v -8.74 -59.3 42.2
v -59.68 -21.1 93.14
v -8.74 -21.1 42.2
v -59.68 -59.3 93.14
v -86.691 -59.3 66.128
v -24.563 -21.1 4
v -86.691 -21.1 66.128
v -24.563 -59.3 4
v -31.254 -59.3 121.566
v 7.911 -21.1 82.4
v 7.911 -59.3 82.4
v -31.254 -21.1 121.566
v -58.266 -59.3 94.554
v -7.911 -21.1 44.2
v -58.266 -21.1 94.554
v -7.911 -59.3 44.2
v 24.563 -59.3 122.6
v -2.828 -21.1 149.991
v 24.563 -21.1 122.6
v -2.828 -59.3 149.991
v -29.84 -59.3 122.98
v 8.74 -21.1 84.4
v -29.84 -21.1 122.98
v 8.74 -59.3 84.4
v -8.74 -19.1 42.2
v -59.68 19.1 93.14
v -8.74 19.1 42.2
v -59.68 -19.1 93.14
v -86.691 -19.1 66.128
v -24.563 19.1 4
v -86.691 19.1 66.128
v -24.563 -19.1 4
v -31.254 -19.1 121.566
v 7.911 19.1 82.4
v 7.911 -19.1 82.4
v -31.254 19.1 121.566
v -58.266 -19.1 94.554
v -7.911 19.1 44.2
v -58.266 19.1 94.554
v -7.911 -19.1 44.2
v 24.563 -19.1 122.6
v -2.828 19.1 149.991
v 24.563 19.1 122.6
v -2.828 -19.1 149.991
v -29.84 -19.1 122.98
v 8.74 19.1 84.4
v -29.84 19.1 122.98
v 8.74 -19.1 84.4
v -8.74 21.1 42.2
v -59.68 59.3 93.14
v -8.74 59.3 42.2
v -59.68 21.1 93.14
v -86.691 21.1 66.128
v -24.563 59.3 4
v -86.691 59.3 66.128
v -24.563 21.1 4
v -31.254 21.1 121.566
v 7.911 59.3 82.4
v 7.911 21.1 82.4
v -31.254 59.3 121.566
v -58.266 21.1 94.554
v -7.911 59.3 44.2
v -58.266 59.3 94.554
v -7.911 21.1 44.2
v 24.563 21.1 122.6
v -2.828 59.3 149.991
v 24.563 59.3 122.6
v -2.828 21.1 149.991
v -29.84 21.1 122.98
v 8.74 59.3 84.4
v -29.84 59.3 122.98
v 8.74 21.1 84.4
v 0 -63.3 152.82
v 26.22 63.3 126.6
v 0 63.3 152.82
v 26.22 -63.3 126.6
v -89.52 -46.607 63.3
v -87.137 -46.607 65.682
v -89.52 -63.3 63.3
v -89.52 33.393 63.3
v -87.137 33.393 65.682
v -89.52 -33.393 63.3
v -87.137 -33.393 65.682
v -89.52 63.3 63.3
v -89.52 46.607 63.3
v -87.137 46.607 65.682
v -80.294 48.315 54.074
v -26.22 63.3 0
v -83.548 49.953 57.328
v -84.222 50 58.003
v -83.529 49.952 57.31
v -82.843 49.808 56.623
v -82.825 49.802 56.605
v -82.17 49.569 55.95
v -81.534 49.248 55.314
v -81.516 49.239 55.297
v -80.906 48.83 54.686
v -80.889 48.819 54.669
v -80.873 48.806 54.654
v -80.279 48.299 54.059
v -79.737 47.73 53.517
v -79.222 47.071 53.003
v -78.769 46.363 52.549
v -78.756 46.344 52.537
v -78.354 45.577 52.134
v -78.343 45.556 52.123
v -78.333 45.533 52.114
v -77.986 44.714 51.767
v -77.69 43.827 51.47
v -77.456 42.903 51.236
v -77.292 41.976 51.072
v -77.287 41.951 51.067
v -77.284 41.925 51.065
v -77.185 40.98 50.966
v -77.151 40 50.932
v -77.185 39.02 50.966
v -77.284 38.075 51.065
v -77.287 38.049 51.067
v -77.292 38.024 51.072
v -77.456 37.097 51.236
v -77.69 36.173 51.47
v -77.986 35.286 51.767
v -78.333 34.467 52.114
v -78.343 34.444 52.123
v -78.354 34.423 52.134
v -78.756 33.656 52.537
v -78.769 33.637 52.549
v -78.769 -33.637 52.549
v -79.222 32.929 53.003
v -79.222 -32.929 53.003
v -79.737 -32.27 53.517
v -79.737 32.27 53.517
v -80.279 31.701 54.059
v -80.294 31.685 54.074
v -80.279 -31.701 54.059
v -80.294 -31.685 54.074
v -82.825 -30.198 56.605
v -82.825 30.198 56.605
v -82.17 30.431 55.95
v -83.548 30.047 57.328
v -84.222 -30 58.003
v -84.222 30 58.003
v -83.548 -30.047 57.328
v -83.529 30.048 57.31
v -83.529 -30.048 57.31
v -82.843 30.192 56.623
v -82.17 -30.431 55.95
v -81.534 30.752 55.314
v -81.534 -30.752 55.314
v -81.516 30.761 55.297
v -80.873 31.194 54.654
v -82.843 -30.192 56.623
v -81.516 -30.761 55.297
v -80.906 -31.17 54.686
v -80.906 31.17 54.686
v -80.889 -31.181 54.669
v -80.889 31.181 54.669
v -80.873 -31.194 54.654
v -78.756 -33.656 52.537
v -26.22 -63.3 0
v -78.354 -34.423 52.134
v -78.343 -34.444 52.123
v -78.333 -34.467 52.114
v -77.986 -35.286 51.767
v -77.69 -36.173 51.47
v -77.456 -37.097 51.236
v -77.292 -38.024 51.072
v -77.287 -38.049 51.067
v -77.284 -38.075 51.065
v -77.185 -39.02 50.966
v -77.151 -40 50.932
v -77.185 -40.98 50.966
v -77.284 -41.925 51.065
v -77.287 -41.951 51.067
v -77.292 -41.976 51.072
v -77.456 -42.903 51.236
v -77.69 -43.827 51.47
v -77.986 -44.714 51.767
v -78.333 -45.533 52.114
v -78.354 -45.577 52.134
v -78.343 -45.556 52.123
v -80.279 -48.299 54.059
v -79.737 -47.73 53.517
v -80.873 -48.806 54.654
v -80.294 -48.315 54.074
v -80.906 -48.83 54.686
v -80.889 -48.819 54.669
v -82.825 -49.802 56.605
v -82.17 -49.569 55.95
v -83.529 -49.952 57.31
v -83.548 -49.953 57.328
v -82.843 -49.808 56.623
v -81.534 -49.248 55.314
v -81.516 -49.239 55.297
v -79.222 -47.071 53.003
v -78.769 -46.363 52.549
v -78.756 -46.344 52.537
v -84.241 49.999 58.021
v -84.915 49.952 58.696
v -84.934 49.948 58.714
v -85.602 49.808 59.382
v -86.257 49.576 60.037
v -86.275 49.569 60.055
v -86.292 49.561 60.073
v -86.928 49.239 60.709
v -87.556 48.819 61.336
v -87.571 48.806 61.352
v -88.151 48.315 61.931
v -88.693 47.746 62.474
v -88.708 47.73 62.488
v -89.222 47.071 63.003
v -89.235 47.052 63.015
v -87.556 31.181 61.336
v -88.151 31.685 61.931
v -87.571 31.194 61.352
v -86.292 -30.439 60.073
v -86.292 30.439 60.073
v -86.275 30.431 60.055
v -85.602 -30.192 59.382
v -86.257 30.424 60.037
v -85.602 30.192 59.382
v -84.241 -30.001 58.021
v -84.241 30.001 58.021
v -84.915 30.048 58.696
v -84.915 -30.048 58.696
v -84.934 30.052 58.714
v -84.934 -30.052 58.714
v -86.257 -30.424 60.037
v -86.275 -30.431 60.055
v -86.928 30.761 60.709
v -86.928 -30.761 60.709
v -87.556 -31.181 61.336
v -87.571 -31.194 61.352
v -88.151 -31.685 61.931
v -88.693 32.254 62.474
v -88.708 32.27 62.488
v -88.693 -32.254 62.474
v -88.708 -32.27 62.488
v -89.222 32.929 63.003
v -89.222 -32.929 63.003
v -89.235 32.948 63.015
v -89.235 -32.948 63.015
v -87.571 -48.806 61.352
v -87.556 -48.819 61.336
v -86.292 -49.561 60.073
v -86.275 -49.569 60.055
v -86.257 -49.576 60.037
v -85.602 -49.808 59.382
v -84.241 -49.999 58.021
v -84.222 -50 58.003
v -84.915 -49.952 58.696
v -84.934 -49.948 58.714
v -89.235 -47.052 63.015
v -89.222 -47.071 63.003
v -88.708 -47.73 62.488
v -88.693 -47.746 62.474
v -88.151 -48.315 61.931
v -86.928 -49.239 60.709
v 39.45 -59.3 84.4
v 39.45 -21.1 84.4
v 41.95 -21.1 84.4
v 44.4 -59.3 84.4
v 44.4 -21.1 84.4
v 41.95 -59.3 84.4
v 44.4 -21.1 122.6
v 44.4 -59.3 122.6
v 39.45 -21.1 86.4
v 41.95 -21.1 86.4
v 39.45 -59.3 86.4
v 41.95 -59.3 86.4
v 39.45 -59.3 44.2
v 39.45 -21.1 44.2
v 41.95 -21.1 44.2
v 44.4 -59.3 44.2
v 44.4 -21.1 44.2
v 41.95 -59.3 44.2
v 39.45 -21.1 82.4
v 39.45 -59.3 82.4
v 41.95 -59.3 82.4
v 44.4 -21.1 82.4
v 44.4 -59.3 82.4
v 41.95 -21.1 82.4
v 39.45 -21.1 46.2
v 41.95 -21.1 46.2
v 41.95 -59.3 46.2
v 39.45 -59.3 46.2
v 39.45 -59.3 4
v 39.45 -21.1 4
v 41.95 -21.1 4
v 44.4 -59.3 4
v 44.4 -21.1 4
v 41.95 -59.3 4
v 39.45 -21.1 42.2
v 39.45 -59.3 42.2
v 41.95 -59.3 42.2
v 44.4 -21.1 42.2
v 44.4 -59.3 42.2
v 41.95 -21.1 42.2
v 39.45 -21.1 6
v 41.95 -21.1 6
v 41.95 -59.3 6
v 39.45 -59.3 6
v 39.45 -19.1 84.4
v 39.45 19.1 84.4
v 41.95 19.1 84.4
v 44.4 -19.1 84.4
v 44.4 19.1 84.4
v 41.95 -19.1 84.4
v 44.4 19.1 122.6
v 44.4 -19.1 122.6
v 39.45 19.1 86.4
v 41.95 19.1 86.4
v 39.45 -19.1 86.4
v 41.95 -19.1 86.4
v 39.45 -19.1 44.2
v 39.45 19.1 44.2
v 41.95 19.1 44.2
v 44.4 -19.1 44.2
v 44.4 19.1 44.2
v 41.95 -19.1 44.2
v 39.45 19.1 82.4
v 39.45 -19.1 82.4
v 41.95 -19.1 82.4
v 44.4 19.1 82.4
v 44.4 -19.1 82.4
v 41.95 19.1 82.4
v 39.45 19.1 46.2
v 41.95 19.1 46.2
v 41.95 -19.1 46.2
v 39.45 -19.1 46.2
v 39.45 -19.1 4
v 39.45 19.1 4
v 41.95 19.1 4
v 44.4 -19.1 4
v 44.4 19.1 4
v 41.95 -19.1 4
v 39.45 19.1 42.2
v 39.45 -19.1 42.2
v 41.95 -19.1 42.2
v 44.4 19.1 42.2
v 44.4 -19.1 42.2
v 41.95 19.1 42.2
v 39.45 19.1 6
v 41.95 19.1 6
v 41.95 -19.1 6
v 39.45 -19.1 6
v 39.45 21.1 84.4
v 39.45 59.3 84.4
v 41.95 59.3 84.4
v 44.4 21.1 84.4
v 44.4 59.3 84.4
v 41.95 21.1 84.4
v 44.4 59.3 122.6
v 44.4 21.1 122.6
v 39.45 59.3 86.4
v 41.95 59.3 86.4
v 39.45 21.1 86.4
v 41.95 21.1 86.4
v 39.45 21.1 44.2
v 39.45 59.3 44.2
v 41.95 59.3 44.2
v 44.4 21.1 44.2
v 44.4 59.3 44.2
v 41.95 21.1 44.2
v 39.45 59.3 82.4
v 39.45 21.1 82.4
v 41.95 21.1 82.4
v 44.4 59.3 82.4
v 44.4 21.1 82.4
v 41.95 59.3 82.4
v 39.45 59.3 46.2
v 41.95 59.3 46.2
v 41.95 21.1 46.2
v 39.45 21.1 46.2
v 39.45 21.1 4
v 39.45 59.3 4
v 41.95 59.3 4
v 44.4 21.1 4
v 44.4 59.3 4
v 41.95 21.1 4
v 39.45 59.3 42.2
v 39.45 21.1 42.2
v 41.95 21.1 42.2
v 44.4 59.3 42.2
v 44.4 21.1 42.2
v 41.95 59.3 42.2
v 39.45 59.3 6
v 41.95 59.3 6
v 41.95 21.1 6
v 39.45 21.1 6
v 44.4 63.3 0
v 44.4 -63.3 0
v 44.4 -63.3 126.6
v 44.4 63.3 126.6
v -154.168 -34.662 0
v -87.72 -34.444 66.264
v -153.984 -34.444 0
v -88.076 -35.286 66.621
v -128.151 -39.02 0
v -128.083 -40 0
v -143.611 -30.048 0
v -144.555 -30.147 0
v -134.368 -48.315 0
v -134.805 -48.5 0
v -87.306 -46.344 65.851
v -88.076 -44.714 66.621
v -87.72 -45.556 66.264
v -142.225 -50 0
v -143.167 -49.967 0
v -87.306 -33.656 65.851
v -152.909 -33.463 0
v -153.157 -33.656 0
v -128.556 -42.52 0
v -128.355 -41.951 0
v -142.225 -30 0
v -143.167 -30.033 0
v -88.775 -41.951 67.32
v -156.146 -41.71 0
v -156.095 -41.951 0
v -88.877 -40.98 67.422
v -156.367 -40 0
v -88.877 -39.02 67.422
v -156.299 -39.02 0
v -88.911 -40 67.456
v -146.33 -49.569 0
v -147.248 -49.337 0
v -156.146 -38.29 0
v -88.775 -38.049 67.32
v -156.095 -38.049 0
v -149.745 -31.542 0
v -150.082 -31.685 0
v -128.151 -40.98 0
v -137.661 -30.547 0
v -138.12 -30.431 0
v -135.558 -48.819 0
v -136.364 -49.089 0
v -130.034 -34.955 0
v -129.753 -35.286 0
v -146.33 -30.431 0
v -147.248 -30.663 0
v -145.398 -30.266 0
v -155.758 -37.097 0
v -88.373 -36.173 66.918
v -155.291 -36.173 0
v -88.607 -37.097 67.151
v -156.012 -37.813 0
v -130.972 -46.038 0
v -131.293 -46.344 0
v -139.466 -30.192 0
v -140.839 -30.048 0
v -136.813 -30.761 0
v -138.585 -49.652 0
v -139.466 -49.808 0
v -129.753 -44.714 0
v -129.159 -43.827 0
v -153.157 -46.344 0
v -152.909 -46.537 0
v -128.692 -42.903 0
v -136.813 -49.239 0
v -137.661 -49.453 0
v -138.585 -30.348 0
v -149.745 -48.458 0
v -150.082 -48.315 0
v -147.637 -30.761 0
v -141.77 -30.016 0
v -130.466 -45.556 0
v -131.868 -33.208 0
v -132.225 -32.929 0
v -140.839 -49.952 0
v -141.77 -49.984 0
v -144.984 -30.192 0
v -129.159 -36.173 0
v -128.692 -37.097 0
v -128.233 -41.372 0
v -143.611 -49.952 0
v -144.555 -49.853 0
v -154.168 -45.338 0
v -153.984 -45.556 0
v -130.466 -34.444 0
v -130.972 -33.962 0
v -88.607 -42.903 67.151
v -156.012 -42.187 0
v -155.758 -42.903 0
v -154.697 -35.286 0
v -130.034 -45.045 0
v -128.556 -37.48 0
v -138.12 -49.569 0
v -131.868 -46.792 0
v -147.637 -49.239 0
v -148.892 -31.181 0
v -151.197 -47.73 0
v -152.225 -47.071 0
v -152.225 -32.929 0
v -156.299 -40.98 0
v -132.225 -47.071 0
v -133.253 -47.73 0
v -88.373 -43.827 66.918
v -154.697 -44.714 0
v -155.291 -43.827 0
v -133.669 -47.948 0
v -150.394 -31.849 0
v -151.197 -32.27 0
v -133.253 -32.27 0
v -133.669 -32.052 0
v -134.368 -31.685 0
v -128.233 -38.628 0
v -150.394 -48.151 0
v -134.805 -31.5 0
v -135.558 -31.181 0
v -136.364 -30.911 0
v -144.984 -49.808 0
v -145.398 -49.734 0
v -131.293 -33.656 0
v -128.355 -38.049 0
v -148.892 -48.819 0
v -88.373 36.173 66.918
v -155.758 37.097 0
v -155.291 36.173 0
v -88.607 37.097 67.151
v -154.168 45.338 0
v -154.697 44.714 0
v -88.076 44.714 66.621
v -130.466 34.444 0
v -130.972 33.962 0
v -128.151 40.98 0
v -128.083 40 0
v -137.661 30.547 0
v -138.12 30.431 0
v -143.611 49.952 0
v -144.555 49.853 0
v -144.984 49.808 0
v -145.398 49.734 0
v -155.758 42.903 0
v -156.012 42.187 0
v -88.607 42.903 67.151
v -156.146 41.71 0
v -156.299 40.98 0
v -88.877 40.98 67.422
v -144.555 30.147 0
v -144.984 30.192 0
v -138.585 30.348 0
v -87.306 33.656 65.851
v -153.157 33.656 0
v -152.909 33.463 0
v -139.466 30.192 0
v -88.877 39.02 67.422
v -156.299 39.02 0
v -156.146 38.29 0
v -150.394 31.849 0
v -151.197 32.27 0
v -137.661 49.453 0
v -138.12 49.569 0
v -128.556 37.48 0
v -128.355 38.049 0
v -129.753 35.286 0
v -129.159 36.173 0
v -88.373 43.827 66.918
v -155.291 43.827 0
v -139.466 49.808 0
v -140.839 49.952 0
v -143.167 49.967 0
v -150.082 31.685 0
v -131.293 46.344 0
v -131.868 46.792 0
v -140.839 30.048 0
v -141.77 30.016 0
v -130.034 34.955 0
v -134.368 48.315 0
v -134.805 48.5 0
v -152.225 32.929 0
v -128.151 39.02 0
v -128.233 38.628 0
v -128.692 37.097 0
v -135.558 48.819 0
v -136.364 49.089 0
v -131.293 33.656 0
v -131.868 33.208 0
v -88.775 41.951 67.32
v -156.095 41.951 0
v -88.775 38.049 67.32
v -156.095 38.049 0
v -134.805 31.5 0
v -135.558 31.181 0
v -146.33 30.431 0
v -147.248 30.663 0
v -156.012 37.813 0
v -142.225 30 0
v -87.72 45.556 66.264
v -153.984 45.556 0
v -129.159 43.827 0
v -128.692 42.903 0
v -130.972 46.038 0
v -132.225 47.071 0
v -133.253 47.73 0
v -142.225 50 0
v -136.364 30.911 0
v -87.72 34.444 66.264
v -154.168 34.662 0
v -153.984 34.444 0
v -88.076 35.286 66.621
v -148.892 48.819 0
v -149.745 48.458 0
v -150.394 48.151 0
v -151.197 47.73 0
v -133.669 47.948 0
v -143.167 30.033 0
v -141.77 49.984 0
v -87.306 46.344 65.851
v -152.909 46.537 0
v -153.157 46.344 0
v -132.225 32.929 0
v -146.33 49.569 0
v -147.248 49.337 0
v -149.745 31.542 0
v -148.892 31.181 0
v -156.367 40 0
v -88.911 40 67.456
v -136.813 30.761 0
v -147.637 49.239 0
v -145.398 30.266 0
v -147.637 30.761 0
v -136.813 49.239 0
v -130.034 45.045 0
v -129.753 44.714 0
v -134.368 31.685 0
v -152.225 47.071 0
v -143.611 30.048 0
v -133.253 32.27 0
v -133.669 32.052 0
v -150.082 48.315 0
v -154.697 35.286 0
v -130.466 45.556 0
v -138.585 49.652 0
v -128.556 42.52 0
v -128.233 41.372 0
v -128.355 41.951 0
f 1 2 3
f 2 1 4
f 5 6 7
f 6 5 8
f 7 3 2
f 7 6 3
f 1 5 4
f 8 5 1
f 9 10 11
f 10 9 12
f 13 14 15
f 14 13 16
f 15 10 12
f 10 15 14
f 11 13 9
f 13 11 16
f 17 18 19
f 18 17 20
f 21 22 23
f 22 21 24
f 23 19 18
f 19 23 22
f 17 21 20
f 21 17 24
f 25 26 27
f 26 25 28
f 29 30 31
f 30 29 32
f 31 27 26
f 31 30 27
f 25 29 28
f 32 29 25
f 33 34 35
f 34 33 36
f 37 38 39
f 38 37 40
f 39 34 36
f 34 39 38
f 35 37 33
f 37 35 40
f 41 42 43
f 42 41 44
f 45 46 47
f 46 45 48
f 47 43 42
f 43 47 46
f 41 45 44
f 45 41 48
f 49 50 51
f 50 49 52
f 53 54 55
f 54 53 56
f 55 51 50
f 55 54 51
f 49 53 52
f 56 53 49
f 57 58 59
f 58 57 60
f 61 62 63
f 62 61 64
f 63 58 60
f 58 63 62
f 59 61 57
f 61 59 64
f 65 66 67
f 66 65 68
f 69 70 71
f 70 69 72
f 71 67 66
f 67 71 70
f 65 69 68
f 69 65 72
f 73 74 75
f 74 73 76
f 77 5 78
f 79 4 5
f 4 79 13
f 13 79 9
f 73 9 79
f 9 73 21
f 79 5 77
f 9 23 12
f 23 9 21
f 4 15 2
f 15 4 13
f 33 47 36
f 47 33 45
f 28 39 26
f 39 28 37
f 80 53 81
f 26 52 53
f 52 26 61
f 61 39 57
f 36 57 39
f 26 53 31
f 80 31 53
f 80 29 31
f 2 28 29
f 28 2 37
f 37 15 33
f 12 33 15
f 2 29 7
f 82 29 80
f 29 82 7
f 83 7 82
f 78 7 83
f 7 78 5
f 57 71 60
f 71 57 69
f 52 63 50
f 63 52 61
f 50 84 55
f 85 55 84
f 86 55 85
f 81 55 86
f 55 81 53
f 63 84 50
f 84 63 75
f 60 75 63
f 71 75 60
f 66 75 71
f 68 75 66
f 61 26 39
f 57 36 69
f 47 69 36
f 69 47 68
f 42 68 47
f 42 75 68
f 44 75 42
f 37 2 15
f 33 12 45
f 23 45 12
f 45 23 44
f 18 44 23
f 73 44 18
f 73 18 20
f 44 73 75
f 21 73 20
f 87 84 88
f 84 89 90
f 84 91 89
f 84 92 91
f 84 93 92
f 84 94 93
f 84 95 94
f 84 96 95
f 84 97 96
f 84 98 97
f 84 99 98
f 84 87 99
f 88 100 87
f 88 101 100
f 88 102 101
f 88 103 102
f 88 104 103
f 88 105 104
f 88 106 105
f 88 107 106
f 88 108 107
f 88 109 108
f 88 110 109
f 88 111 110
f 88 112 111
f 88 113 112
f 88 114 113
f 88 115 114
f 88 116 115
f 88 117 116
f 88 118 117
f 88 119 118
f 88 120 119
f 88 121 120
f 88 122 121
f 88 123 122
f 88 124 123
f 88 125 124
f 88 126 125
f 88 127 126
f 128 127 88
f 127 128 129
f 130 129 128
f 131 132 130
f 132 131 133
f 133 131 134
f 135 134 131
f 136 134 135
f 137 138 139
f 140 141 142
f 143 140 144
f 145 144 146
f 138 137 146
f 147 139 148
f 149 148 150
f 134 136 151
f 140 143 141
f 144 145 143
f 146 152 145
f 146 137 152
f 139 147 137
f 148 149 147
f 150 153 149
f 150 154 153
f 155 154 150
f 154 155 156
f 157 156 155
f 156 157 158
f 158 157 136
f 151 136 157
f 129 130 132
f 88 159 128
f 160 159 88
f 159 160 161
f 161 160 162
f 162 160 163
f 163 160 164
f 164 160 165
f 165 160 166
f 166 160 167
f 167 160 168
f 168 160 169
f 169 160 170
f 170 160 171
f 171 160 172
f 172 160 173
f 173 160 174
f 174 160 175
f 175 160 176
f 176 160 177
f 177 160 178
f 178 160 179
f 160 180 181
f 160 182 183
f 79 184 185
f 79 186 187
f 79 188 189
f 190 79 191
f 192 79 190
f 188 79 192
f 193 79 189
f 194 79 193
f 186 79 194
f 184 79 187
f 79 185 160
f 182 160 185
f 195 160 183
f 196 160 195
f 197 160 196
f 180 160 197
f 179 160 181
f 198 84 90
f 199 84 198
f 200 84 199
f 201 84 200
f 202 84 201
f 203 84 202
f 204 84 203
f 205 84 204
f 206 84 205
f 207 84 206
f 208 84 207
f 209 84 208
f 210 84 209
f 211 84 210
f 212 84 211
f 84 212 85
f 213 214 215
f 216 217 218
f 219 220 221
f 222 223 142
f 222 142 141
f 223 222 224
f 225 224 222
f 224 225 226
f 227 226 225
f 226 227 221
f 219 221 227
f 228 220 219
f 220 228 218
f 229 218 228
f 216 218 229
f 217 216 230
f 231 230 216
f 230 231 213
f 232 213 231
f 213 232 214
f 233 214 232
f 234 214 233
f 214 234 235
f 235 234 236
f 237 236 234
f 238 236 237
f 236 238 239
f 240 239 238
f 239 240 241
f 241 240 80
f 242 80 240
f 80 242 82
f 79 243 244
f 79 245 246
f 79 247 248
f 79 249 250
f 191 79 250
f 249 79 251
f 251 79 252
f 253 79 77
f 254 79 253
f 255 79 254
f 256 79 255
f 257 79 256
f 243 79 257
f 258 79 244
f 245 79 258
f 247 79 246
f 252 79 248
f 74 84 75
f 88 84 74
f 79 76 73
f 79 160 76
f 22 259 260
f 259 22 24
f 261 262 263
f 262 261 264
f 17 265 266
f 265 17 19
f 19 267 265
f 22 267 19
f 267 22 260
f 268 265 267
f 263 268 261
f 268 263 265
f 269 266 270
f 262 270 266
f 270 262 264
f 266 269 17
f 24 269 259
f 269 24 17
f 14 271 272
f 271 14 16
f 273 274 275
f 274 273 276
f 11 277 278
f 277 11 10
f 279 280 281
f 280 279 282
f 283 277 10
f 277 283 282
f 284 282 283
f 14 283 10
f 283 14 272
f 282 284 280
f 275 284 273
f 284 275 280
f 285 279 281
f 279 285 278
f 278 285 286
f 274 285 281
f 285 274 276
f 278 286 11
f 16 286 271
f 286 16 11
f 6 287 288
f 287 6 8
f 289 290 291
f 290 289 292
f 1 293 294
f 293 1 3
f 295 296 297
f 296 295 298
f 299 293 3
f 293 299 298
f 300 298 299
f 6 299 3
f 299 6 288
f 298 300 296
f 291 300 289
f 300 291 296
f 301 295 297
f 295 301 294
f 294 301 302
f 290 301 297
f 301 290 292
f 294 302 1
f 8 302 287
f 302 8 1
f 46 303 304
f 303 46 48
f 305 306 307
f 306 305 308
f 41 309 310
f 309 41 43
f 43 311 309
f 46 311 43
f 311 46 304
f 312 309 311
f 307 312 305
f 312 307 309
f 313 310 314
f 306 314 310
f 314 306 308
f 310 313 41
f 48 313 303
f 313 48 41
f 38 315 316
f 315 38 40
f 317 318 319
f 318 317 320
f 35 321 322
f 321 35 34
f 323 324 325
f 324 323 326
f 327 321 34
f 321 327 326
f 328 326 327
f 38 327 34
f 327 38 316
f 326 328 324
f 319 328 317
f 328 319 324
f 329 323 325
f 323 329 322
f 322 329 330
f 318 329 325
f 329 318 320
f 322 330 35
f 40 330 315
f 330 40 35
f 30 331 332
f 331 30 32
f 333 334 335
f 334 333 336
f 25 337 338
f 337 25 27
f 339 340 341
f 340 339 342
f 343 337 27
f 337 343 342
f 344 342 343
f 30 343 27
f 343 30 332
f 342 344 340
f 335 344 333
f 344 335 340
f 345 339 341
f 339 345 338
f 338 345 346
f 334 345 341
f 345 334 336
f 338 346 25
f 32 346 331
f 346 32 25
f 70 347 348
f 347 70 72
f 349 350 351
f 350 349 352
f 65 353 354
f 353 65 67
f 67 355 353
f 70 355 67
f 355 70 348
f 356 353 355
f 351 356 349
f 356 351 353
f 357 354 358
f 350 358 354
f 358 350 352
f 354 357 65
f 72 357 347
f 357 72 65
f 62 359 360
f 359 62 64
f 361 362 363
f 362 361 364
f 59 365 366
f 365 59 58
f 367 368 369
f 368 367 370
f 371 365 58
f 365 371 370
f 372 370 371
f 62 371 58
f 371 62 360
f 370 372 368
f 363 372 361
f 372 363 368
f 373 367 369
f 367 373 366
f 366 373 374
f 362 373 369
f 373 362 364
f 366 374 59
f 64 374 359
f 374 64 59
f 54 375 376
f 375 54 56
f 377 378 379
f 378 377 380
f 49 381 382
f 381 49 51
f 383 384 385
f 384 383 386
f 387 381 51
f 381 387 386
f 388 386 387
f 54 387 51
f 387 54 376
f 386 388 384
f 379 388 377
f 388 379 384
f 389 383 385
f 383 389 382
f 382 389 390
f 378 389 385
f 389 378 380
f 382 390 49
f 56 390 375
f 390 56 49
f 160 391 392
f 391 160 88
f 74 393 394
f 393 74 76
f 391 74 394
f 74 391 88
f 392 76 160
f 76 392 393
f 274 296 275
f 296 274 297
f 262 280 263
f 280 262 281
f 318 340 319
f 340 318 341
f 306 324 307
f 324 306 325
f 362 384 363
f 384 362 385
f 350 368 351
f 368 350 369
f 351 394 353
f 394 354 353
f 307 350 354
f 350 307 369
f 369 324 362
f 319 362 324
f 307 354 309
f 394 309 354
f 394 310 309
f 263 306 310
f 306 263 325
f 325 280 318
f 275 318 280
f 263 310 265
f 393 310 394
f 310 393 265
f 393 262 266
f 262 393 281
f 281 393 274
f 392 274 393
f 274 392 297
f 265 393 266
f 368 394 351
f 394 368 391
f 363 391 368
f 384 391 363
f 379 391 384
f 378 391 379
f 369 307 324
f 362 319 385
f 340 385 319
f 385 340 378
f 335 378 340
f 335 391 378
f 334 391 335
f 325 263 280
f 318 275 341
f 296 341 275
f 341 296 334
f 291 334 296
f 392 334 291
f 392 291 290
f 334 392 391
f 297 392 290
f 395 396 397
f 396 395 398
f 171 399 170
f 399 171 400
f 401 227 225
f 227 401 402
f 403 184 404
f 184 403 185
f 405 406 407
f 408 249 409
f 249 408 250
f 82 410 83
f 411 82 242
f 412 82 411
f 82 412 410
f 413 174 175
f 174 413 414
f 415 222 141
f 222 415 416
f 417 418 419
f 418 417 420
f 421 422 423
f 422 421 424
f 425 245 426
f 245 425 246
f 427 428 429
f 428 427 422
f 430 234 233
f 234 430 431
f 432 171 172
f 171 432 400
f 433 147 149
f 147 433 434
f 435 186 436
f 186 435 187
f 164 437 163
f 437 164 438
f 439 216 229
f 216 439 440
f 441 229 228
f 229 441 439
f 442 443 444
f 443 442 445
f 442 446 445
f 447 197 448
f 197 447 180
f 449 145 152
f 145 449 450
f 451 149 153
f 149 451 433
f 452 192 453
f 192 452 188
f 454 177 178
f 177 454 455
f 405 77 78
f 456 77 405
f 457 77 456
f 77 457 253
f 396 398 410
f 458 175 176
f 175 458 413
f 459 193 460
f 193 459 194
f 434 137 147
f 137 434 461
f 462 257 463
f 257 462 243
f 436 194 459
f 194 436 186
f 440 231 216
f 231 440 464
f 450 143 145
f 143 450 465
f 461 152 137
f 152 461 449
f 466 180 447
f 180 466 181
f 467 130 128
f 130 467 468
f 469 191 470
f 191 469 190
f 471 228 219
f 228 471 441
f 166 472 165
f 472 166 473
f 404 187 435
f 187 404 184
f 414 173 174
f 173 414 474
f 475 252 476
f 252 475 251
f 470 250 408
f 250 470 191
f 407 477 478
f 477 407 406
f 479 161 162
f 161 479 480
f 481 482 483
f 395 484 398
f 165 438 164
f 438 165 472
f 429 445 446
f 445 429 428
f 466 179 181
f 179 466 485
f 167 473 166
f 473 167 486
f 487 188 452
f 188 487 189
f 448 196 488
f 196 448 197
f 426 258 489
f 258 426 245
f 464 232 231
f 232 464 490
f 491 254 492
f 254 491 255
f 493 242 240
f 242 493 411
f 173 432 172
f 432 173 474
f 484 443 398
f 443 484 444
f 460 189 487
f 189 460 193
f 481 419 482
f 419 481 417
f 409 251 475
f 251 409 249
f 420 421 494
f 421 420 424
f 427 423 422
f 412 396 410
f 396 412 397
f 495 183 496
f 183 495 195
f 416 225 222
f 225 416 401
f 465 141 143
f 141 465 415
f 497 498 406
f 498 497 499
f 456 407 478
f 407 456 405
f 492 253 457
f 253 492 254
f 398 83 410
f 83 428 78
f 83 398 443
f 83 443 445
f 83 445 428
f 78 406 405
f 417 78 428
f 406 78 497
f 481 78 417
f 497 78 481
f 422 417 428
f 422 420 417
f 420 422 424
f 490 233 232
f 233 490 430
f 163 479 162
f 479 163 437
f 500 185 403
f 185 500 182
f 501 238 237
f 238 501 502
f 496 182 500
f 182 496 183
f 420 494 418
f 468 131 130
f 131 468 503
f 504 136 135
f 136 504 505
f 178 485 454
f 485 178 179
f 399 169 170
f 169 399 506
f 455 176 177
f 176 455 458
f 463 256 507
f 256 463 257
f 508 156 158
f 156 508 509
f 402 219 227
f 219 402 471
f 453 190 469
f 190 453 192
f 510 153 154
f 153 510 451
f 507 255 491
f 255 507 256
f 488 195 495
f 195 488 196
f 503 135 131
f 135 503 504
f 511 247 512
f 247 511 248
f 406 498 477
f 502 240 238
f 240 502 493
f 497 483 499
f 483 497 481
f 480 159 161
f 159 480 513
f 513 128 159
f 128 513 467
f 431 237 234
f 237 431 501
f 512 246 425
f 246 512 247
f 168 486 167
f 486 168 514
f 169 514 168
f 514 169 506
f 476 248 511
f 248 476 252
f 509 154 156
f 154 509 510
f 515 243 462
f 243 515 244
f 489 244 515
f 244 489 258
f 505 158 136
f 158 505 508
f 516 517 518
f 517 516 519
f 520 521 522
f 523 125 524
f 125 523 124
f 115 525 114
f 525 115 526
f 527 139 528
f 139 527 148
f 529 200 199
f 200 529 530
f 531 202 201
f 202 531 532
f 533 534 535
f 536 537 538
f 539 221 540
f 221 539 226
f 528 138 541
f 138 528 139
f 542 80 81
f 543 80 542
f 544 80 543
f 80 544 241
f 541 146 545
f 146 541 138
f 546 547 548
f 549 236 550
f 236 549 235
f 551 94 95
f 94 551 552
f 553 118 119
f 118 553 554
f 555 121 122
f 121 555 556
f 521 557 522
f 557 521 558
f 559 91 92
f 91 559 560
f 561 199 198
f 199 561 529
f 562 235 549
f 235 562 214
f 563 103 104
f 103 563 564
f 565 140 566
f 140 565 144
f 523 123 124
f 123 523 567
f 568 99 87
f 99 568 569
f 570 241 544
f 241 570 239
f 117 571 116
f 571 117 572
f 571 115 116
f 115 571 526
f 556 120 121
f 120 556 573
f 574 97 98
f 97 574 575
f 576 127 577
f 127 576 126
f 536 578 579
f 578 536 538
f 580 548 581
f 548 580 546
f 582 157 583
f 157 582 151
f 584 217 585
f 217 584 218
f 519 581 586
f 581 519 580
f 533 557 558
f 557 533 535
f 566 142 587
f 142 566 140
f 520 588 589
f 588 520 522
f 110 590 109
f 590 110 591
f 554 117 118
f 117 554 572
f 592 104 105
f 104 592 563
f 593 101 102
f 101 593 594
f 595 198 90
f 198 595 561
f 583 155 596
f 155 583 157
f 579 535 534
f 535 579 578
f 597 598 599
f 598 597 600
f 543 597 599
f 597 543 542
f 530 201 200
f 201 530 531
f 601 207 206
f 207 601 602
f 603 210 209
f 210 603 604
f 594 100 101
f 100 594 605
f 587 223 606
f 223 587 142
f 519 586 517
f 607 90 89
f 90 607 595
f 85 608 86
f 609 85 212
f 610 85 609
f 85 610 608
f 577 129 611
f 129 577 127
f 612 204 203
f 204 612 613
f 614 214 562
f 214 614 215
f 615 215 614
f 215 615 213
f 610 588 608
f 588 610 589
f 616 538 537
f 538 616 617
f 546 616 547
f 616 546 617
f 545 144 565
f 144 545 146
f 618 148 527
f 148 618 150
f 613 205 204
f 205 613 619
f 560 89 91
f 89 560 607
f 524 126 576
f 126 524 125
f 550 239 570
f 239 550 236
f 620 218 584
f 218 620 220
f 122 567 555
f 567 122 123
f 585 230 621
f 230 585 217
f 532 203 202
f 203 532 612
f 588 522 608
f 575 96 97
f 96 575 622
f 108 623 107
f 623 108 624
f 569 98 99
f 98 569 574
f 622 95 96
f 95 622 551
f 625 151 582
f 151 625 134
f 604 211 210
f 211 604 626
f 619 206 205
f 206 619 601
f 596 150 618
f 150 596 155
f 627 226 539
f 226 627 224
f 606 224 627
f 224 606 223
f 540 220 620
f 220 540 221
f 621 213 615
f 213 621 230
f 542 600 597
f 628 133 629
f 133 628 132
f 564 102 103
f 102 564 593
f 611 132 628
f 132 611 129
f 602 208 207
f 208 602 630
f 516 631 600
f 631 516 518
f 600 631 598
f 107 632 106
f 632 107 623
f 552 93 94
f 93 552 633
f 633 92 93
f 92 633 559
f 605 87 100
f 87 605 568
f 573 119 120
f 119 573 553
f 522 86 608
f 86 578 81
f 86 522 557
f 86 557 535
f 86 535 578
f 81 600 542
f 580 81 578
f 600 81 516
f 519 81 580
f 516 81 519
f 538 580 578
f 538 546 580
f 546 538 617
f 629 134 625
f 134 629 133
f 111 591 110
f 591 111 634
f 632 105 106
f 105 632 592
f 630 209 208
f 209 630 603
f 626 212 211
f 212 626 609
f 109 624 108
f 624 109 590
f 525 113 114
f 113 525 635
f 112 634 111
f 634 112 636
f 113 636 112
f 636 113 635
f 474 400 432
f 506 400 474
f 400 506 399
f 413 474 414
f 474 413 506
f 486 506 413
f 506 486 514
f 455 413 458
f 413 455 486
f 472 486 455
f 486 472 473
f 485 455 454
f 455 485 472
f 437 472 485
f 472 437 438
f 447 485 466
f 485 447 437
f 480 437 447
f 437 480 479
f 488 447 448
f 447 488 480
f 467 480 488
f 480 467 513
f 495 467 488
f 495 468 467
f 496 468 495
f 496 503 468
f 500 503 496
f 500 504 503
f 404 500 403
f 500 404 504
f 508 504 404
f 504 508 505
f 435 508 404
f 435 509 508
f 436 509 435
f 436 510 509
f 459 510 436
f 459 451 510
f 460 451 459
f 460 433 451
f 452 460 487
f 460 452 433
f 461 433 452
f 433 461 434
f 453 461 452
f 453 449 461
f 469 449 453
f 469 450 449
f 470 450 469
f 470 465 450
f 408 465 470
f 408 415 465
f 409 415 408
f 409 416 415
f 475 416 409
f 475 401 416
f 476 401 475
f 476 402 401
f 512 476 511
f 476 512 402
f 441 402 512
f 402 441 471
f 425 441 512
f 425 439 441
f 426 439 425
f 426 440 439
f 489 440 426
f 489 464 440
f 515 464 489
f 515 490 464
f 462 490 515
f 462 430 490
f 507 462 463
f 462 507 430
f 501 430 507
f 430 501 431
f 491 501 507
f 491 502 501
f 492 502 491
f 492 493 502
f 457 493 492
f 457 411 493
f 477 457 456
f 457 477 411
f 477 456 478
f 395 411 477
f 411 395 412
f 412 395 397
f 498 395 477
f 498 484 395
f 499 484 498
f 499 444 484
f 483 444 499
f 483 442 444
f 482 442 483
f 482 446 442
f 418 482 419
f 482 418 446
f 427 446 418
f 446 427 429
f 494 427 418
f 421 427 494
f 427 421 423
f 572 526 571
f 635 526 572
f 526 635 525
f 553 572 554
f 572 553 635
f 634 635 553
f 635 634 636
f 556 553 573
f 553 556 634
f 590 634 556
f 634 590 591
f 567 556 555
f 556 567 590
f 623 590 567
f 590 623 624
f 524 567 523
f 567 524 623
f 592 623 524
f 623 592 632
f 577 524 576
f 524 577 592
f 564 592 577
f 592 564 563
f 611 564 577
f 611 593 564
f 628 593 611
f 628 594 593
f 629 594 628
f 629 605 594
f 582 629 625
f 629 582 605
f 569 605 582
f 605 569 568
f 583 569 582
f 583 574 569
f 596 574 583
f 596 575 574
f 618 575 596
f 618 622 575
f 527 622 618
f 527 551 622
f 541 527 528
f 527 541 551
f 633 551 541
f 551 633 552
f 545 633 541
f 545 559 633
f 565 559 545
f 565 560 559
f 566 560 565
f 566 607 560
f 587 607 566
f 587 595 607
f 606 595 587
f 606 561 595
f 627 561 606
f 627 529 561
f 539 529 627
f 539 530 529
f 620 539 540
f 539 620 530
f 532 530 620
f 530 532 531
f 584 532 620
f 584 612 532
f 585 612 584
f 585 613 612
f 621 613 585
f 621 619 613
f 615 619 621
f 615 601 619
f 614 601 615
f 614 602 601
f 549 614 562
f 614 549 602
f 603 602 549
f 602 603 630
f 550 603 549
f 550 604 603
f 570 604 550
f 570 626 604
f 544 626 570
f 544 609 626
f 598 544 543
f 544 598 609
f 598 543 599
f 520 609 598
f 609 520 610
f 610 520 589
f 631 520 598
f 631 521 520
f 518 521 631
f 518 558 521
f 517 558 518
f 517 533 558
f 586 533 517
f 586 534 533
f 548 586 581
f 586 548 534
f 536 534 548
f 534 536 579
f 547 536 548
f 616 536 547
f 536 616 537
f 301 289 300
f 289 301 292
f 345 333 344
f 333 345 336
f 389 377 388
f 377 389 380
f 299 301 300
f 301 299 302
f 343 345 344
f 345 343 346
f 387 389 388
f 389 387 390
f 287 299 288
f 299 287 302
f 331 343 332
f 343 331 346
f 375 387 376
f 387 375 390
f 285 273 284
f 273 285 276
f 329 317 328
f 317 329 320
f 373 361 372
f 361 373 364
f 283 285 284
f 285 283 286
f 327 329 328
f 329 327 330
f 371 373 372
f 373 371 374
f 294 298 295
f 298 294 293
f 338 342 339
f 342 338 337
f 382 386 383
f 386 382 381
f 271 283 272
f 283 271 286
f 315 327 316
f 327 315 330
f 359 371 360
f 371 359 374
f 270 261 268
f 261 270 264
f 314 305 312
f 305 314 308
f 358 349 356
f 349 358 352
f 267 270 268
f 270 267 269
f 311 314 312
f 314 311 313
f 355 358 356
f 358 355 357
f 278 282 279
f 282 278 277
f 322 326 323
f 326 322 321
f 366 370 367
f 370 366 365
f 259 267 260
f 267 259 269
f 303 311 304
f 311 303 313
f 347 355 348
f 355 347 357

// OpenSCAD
use <MCAD/layouts.scad>;

gap=0.2;
box_size=[38+gap, 38+gap, 280];
capsule_h=29;
capsule_d1=24;
capsule_d2=29.5;
capsule_d3=37;

storage_wall=2;
storage_h=(3*box_size[0]+6*storage_wall);

block_size=[3*box_size[0]+6*storage_wall, 3*box_size[1]+6*storage_wall, storage_h];

module NespressoBox() {    
    color("gray") cube(box_size);
}

module NespressoCapusle() {
    $fn=64;
    color("brown") cylinder(h=capsule_h, d1=capsule_d2, d2=capsule_d1);
    color("darkgray") cylinder(h=1,d=capsule_d3);
}

module NespressoBlock() {
    wall_off=[-2*storage_wall, -2*storage_wall, storage_wall];
    translate([for (o=wall_off) -o])
    difference() {
        translate(wall_off)
            cube(block_size);
        grid(box_size[0]+storage_wall, box_size[1]+storage_wall) {
            NespressoBox();
            NespressoBox();
            NespressoBox();
            NespressoBox();
            NespressoBox();
            NespressoBox();
            NespressoBox();
            NespressoBox();
            NespressoBox();
        }
    }
}

module NesspressoBlockJoint() {
    difference() {
        rotate([0,-90+45/2,0])
        translate([for(o=block_size) o/-2])
            NespressoBlock();
        translate([500,0,0])
            cube([1000,1000,1000], center=true);
    }

    difference() {
        rotate([0,90-45/2,0])
        translate([for(o=block_size) o/-2])
            NespressoBlock();
        translate([-500,0,0])
            cube([1000,1000,1000], center=true);
    }
}

translate([0,0,block_size[2]/2])
difference() {
    rotate([0,45/2,0])
        NesspressoBlockJoint();    
    translate([500+capsule_d3*1.2,0,0])
        cube([1000,1000,1000], center=true);
}
//stopper
translate([capsule_d3*1.1, 0, storage_wall*2])
    cube([2.5,block_size[1],4], center=true);
translate([capsule_d3*1.1, 0, storage_wall*3+box_size[1]])
    cube([2.5,block_size[1],4], center=true);
translate([capsule_d3*1.1, 0, storage_wall*4+2*box_size[1]])
    cube([2.5,block_size[1],4], center=true);
// feet
difference() {
    union() {
        translate([-block_size[0],-40,50/1.6/2])
        rotate([0,45,0])
            cylinder($fn=64, d=20, h=block_size[0], center=true);
        translate([-block_size[0],40,50/1.6/2])
        rotate([0,45,0])
            cylinder($fn=64, d=20, h=block_size[0], center=true);
    }
    translate([0,0,-500])
        cube([1000,1000,1000], center=true);
}
